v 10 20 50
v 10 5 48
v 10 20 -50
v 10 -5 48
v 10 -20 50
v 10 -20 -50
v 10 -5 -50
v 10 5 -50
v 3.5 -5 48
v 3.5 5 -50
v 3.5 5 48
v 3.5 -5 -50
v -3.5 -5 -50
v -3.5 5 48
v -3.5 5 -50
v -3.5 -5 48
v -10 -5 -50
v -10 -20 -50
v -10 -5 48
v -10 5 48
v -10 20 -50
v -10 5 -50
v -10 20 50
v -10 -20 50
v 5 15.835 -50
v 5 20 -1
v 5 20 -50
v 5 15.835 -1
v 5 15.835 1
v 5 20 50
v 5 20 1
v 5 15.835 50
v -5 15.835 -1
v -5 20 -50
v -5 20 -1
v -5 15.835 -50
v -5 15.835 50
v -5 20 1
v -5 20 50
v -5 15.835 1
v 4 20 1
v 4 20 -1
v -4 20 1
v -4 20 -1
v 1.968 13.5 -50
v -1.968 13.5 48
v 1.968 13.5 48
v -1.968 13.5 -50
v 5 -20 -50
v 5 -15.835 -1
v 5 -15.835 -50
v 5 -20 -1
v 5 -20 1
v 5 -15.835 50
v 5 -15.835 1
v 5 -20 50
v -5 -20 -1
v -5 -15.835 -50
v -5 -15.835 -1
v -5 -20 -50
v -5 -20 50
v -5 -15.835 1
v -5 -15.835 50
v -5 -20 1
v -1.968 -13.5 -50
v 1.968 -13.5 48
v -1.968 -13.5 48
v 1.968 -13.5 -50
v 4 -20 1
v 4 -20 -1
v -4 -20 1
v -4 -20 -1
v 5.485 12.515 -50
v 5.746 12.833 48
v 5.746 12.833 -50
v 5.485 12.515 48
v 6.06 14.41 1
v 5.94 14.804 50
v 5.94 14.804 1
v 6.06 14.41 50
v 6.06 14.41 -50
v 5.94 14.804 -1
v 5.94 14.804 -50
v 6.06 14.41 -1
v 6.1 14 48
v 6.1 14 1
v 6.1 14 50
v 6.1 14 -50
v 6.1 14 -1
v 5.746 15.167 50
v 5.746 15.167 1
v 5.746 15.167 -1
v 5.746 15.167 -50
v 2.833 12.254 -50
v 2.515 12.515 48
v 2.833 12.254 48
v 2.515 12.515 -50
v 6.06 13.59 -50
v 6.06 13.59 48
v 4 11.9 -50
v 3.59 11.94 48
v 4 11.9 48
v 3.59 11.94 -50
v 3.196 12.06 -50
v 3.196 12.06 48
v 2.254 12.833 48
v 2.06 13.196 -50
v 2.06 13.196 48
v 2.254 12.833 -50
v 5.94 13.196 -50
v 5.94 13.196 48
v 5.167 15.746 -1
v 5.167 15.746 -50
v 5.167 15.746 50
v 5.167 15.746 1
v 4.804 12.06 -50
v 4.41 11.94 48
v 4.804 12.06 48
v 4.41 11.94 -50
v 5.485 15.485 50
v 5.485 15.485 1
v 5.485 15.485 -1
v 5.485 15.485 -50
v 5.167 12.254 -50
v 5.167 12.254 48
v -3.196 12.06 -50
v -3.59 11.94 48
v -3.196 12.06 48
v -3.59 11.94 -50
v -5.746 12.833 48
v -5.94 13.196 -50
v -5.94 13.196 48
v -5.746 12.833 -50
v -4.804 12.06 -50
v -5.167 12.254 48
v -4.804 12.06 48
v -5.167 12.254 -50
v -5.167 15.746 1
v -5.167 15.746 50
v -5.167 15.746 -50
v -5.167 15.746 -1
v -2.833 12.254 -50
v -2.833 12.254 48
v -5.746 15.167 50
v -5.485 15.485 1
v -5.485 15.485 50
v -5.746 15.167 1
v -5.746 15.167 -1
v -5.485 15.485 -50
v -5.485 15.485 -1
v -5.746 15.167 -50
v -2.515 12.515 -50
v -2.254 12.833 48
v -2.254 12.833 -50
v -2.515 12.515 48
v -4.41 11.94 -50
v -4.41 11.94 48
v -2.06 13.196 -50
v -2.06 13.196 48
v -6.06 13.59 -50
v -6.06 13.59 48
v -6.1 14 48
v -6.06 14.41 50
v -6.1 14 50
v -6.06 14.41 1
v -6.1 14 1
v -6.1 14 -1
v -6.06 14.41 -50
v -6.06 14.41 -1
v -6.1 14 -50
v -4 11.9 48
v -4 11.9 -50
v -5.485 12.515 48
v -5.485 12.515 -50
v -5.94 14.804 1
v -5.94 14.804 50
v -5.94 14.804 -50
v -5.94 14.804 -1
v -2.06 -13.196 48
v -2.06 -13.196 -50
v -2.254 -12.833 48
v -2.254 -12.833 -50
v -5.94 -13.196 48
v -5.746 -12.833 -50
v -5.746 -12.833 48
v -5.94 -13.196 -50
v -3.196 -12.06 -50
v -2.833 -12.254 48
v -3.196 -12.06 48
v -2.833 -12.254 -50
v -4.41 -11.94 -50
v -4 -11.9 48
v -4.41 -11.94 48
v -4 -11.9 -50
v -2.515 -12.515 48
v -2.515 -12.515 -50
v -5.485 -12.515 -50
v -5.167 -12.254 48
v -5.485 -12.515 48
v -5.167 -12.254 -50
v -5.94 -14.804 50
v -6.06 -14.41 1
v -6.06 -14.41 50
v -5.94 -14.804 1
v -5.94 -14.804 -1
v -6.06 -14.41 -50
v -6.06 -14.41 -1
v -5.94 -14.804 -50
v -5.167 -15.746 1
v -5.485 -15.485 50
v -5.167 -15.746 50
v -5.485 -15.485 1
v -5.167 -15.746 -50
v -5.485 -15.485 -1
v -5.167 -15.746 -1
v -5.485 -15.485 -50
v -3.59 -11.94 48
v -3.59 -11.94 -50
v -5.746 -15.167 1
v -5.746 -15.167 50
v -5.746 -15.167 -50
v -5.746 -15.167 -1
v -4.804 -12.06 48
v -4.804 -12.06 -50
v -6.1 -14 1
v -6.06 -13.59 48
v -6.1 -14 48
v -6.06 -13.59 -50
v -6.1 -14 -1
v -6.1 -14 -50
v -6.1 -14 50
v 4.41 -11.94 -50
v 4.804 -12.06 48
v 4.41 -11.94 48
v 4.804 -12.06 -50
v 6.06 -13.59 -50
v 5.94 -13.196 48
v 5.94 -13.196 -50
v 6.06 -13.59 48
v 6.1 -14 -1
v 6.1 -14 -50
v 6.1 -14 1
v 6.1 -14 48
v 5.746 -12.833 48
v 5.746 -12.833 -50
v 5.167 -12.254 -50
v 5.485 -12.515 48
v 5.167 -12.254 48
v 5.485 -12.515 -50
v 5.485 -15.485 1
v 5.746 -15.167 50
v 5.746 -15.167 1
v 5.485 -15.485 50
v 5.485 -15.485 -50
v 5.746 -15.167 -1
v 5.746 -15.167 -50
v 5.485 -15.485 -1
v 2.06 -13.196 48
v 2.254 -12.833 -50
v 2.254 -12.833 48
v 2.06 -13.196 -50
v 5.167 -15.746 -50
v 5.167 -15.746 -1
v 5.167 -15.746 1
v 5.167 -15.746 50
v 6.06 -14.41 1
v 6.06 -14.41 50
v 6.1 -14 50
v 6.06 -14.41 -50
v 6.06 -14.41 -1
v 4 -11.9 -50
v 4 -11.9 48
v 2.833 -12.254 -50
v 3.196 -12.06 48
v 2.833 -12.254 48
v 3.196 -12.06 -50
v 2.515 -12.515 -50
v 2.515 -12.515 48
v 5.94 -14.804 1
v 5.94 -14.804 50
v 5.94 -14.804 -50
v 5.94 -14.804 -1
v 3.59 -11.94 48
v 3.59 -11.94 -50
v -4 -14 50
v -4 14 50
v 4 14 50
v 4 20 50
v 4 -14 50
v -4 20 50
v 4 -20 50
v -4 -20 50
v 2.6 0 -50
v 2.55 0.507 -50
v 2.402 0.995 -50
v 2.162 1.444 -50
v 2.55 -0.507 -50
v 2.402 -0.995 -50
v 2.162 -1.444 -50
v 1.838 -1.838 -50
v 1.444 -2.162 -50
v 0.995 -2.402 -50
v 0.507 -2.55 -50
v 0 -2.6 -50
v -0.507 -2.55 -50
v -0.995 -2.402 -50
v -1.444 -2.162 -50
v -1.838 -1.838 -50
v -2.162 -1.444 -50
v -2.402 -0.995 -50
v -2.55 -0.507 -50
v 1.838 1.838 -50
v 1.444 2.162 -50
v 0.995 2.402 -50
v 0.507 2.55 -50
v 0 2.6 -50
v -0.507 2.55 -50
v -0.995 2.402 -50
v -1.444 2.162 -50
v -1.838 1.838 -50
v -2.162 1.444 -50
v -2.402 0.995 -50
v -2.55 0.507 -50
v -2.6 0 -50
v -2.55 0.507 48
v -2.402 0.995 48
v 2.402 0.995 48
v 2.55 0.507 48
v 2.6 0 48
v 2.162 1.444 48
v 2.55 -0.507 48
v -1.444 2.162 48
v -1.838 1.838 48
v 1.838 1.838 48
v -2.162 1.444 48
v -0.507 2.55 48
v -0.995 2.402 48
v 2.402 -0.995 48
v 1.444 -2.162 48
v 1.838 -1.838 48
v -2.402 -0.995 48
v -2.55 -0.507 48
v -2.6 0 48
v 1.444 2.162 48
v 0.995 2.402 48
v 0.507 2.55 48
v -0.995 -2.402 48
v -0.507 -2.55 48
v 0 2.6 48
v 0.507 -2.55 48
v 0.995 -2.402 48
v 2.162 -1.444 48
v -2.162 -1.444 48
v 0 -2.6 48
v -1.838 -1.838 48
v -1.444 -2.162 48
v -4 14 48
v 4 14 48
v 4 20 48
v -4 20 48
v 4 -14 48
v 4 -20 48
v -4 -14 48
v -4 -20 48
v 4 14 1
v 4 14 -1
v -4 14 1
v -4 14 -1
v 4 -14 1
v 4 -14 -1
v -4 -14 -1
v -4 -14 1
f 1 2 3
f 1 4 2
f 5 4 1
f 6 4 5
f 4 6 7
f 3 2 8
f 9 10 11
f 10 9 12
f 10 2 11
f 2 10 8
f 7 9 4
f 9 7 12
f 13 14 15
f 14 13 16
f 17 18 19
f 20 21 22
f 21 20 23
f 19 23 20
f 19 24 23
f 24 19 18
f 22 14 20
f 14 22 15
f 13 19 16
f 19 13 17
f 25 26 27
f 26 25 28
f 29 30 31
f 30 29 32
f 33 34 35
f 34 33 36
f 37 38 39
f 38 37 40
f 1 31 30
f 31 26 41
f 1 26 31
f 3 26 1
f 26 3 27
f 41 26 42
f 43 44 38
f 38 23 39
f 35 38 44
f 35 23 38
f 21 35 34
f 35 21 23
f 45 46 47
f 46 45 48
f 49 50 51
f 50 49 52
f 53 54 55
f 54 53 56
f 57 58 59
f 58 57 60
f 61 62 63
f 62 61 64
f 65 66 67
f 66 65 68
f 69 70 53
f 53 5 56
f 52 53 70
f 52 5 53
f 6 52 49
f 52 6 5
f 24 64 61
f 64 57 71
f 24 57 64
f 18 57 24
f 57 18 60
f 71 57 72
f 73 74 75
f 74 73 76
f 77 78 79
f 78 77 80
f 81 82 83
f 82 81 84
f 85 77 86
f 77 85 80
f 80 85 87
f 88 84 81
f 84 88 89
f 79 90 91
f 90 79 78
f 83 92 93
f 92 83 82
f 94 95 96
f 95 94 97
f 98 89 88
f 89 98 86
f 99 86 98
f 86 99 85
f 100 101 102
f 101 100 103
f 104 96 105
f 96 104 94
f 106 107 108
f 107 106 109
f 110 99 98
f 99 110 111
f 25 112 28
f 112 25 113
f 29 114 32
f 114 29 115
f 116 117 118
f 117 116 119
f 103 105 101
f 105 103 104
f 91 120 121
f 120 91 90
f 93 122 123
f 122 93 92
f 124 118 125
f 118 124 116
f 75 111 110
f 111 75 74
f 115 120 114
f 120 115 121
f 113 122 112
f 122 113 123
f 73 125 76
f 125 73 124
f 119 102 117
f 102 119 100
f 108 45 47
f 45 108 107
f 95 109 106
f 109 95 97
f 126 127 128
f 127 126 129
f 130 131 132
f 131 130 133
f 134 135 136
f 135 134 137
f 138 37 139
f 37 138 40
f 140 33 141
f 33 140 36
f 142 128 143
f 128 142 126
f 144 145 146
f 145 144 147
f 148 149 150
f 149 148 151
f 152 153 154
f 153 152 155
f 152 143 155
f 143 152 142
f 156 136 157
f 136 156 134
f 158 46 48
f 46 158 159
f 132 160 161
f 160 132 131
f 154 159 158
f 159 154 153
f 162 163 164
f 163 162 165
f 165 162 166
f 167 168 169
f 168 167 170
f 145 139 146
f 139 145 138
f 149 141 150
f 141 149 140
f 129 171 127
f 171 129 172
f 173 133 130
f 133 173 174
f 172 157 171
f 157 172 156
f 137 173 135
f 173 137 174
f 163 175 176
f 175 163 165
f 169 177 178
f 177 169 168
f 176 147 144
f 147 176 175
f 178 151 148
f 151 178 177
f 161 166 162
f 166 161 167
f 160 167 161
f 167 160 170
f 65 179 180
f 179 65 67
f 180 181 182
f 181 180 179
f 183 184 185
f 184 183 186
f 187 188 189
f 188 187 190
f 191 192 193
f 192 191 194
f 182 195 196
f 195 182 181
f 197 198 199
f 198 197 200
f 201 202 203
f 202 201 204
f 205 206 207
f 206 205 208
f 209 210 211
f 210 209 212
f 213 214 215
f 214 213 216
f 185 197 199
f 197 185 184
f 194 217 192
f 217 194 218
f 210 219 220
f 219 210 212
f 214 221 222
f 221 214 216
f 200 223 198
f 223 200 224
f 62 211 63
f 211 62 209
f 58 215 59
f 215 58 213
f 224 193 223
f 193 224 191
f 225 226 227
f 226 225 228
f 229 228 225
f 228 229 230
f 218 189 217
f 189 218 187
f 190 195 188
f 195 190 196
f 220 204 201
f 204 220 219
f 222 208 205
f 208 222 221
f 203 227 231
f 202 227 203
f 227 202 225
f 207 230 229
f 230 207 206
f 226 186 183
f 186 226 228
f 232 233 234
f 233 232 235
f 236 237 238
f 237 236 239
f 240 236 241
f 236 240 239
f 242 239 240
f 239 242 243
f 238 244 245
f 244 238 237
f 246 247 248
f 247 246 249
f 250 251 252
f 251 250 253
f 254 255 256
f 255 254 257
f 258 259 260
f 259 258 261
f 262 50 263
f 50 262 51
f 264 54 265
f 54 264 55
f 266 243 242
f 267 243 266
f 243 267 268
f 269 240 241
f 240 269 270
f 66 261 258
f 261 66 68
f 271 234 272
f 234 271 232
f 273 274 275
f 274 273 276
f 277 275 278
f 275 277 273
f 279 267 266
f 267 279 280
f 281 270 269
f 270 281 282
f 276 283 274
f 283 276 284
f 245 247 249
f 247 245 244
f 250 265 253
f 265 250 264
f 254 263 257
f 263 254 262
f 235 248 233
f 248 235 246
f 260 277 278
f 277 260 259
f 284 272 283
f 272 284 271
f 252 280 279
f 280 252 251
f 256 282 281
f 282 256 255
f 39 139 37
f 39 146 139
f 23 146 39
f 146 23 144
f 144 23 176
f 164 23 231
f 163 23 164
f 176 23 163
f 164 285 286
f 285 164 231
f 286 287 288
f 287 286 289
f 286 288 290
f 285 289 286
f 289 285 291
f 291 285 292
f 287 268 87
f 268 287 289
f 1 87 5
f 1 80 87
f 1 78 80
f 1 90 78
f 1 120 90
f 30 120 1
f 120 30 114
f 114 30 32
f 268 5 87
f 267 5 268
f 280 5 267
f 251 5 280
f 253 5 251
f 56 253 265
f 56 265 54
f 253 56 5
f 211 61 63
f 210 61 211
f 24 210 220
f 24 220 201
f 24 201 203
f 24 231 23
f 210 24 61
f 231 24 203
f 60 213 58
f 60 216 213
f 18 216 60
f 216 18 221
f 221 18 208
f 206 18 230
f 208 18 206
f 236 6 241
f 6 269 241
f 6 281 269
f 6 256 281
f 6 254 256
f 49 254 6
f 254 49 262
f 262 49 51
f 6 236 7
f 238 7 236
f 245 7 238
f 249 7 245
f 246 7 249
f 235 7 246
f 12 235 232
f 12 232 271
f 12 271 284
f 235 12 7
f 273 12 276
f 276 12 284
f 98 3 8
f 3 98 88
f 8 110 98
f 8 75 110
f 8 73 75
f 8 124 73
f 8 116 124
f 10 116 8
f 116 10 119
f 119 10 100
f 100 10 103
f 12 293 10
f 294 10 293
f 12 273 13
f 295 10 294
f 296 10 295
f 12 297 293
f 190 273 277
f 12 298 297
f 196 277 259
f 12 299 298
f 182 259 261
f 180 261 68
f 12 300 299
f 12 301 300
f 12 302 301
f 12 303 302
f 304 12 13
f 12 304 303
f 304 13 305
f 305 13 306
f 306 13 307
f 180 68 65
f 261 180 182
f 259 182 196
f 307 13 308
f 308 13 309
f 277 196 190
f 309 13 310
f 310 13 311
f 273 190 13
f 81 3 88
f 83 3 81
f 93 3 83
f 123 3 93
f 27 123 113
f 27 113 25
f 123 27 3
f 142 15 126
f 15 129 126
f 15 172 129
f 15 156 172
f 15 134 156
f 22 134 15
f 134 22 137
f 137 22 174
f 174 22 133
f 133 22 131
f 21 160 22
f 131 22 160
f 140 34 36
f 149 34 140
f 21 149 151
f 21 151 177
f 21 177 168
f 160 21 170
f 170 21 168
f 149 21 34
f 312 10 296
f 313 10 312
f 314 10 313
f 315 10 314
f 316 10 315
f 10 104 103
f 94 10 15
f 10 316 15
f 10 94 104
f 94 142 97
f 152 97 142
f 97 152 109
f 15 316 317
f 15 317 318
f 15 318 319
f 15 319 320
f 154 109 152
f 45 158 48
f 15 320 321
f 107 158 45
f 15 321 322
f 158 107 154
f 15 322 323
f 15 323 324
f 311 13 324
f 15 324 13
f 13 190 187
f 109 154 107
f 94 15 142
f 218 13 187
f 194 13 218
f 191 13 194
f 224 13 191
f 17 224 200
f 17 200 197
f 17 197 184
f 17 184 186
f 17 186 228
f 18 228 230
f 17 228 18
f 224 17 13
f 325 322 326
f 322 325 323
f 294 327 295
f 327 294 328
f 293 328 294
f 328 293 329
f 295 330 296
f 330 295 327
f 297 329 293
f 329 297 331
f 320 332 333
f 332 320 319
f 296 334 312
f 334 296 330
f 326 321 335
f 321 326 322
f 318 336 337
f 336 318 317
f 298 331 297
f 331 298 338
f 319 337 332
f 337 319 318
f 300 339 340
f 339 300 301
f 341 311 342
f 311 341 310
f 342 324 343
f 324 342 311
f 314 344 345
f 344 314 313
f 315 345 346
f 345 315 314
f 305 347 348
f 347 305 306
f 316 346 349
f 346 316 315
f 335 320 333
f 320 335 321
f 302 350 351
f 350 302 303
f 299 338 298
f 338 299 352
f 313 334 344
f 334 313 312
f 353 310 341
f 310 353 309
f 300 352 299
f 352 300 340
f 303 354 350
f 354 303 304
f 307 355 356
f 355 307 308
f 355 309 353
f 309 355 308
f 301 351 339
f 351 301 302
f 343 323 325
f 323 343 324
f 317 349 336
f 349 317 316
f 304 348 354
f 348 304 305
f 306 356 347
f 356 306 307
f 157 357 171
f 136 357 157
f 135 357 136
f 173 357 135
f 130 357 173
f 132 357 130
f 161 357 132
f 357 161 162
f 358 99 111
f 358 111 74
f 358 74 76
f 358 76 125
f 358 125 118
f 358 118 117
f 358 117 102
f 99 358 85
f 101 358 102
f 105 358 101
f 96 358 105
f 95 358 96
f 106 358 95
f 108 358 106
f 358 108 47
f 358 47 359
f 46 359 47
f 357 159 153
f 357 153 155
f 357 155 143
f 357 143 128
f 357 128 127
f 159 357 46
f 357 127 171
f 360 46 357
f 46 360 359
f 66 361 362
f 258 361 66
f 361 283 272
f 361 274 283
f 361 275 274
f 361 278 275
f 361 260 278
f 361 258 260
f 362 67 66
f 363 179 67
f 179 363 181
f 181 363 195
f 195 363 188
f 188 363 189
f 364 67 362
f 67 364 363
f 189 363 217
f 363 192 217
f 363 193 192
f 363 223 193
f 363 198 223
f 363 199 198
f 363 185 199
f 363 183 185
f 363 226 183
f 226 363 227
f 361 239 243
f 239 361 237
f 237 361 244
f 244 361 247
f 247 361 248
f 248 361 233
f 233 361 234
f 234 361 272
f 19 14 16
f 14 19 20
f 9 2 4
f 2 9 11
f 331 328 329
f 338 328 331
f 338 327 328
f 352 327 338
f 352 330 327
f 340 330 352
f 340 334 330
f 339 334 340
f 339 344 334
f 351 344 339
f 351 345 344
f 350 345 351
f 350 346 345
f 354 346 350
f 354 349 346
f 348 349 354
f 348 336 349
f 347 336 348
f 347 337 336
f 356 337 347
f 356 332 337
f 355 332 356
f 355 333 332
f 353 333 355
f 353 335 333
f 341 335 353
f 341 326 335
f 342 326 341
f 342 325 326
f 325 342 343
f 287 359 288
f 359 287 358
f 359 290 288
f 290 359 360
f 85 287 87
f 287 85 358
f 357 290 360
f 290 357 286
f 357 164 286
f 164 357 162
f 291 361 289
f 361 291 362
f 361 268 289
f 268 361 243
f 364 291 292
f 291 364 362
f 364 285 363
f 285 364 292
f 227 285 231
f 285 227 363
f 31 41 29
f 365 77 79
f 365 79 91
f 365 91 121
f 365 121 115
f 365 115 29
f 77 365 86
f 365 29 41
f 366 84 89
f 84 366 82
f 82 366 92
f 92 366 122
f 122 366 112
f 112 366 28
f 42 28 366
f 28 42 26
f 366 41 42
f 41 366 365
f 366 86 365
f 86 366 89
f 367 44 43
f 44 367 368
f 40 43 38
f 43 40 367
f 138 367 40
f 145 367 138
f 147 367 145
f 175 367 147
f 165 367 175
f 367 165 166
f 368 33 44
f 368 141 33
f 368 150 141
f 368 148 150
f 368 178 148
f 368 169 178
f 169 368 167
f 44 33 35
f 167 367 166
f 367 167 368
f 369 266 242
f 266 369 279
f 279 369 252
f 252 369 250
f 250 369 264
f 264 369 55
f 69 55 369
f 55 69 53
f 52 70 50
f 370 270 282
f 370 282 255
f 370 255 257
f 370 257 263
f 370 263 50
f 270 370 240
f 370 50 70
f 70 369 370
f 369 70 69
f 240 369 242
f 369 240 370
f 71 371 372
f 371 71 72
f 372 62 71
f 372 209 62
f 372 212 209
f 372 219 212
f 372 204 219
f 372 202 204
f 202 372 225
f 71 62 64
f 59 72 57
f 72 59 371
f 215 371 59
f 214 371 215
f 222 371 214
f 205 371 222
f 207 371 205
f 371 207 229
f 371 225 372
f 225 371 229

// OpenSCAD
// Parameters
profile_width_mm = 20.0; //[10.0:40.0:0.5]
profile_height_mm = 40.0; //[20.0:80.0:0.5]
length_mm = 100.0; //[50.0:200.0:1]
center_model = 1; //[0:1:1]
include_corner_holes = 1; //[0:1:1]
wall_thickness_mm = 2.0; //[1.0:4.0:0.25]
slot_opening_mm = 6.0; //[4.0:8.0:0.25]
slot_cavity_mm = 10.0; //[7.0:14.0:0.5]
slot_depth_mm = 6.0; //[4.0:10.0:0.25]
center_bore_diameter_mm = 5.2; //[3.0:10.0:0.1]
corner_hole_diameter_mm = 4.2; //[2.0:8.0:0.1]
corner_hole_inset_mm = 6.0; //[4.0:10.0:0.25]
cut_extra_mm = 0.5; //[0.2:2.0:0.1]

// Extrusion - complete geometry
module extrusion() {
  color("Silver") {
    difference() {
      // Main extrusion body
      cube([profile_width_mm, profile_height_mm, length_mm], center=true);
      
      // Center bore
      translate([0, 0, 0])
        cylinder(r=center_bore_diameter_mm/2, h=length_mm + 2*cut_extra_mm, center=true, $fn=32);
      
      // T-slot channels
      union() {
        // X positive
        translate([profile_width_mm/2 - (slot_depth_mm + cut_extra_mm)/2, 0, 0])
          cube([slot_depth_mm + cut_extra_mm, slot_cavity_mm, length_mm + 2*cut_extra_mm], center=true);
        translate([profile_width_mm/2 - (slot_depth_mm + cut_extra_mm)/2, 0, 0])
          cube([slot_depth_mm + cut_extra_mm, slot_opening_mm, length_mm + 2*cut_extra_mm], center=true);
        
        // X negative
        translate([-profile_width_mm/2 + (slot_depth_mm + cut_extra_mm)/2, 0, 0])
          cube([slot_depth_mm + cut_extra_mm, slot_cavity_mm, length_mm + 2*cut_extra_mm], center=true);
        translate([-profile_width_mm/2 + (slot_depth_mm + cut_extra_mm)/2, 0, 0])
          cube([slot_depth_mm + cut_extra_mm, slot_opening_mm, length_mm + 2*cut_extra_mm], center=true);
        
        // Y positive
        translate([0, profile_height_mm/2 - (slot_depth_mm + cut_extra_mm)/2, 0])
          cube([slot_cavity_mm, slot_depth_mm + cut_extra_mm, length_mm + 2*cut_extra_mm], center=true);
        translate([0, profile_height_mm/2 - (slot_depth_mm + cut_extra_mm)/2, 0])
          cube([slot_opening_mm, slot_depth_mm + cut_extra_mm, length_mm + 2*cut_extra_mm], center=true);
        
        // Y negative
        translate([0, -profile_height_mm/2 + (slot_depth_mm + cut_extra_mm)/2, 0])
          cube([slot_cavity_mm, slot_depth_mm + cut_extra_mm, length_mm + 2*cut_extra_mm], center=true);
        translate([0, -profile_height_mm/2 + (slot_depth_mm + cut_extra_mm)/2, 0])
          cube([slot_opening_mm, slot_depth_mm + cut_extra_mm, length_mm + 2*cut_extra_mm], center=true);
      }
      
      // Corner holes
      if (include_corner_holes) {
        union() {
          translate([profile_width_mm/2 - corner_hole_inset_mm, profile_height_mm/2 - corner_hole_inset_mm, 0])
            cylinder(r=corner_hole_diameter_mm/2, h=length_mm + 2*cut_extra_mm, center=true, $fn=32);
          translate([-profile_width_mm/2 + corner_hole_inset_mm, profile_height_mm/2 - corner_hole_inset_mm, 0])
            cylinder(r=corner_hole_diameter_mm/2, h=length_mm + 2*cut_extra_mm, center=true, $fn=32);
          translate([-profile_width_mm/2 + corner_hole_inset_mm, -profile_height_mm/2 + corner_hole_inset_mm, 0])
            cylinder(r=corner_hole_diameter_mm/2, h=length_mm + 2*cut_extra_mm, center=true, $fn=32);
          translate([profile_width_mm/2 - corner_hole_inset_mm, -profile_height_mm/2 + corner_hole_inset_mm, 0])
            cylinder(r=corner_hole_diameter_mm/2, h=length_mm + 2*cut_extra_mm, center=true, $fn=32);
        }
      }
    }
  }
}

// Extrusion Cross Section - complete geometry
module extrusion_cross_section() {
  color("DimGray") {
    difference() {
      // Cross section body
      cube([profile_width_mm, profile_height_mm, wall_thickness_mm], center=true);
      
      // Corner profiles
      union() {
        translate([profile_width_mm/2 - corner_hole_inset_mm/2, profile_height_mm/2 - corner_hole_inset_mm/2, 0])
          cube([corner_hole_inset_mm, corner_hole_inset_mm, wall_thickness_mm], center=true);
        translate([-profile_width_mm/2 + corner_hole_inset_mm/2, profile_height_mm/2 - corner_hole_inset_mm/2, 0])
          cube([corner_hole_inset_mm, corner_hole_inset_mm, wall_thickness_mm], center=true);
        translate([profile_width_mm/2 - corner_hole_inset_mm/2, -profile_height_mm/2 + corner_hole_inset_mm/2, 0])
          cube([corner_hole_inset_mm, corner_hole_inset_mm, wall_thickness_mm], center=true);
        translate([-profile_width_mm/2 + corner_hole_inset_mm/2, -profile_height_mm/2 + corner_hole_inset_mm/2, 0])
          cube([corner_hole_inset_mm, corner_hole_inset_mm, wall_thickness_mm], center=true);
      }
    }
  }
}

// Box Corner Profile Section - complete geometry
module box_corner_profile_section() {
  color("Black") {
    cube([corner_hole_inset_mm, corner_hole_inset_mm, wall_thickness_mm], center=true);
  }
}

// Box Corner Profile Sections - complete geometry
module box_corner_profile_sections() {
  color("Black") {
    union() {
      translate([profile_width_mm/2 - corner_hole_inset_mm/2, profile_height_mm/2 - corner_hole_inset_mm/2, 0])
        box_corner_profile_section();
      translate([-profile_width_mm/2 + corner_hole_inset_mm/2, profile_height_mm/2 - corner_hole_inset_mm/2, 0])
        box_corner_profile_section();
      translate([profile_width_mm/2 - corner_hole_inset_mm/2, -profile_height_mm/2 + corner_hole_inset_mm/2, 0])
        box_corner_profile_section();
      translate([-profile_width_mm/2 + corner_hole_inset_mm/2, -profile_height_mm/2 + corner_hole_inset_mm/2, 0])
        box_corner_profile_section();
    }
  }
}

// Assembly
module assembly() {
  extrusion();
  translate([0, 0, length_mm/2 - wall_thickness_mm/2]) extrusion_cross_section();
  box_corner_profile_sections();
}

assembly();
